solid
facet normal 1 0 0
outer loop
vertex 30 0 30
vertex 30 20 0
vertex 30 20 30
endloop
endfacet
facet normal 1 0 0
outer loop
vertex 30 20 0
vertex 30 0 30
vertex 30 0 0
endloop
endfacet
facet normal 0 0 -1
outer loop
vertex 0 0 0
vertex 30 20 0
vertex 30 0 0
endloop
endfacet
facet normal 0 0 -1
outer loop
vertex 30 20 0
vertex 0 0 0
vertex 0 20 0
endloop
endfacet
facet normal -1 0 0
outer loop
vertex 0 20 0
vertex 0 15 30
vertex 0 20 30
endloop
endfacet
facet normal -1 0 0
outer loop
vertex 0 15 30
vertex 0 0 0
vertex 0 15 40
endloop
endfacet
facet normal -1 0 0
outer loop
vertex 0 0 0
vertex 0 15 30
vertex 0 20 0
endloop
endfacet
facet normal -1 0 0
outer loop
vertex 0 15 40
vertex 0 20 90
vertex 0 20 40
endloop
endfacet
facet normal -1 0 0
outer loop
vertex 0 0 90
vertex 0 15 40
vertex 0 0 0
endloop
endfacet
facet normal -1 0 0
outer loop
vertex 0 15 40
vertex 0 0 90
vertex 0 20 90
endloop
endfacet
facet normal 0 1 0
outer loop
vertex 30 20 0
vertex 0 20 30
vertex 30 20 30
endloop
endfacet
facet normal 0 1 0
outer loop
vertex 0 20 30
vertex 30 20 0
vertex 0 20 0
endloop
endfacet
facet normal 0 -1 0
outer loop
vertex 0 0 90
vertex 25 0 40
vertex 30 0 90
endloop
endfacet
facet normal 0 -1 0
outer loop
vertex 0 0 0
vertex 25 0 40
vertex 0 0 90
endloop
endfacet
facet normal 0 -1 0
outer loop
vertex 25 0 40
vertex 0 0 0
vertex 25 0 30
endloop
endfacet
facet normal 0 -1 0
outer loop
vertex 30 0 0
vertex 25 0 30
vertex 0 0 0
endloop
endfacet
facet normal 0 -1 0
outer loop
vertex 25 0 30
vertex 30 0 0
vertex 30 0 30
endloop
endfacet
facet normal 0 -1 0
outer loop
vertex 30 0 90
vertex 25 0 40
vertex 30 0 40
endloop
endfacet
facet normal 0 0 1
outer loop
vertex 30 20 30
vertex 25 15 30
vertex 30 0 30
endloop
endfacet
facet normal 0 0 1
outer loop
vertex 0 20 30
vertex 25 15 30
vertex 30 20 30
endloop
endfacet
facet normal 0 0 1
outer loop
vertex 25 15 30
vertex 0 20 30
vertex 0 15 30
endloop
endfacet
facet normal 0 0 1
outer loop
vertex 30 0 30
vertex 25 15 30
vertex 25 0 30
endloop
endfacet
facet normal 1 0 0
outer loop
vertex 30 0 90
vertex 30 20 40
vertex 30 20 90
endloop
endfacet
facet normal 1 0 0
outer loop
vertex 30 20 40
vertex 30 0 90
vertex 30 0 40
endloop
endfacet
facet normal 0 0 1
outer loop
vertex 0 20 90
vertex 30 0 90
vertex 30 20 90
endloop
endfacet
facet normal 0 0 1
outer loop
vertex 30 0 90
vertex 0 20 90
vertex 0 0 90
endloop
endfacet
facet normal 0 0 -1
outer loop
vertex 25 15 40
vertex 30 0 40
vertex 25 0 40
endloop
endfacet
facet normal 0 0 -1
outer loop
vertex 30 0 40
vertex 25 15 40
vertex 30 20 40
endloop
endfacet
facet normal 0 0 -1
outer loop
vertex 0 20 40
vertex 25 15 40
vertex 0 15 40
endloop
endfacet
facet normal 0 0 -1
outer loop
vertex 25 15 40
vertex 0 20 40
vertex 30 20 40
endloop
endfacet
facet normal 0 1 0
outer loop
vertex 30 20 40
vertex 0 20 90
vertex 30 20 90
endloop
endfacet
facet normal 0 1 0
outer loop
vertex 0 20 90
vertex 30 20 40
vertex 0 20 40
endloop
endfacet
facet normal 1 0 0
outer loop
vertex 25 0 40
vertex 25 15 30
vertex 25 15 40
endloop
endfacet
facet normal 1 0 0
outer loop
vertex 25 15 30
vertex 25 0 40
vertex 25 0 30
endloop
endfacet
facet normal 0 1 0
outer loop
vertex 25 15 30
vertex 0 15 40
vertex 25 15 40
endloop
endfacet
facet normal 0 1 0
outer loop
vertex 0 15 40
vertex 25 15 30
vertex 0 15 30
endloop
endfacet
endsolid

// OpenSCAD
// Parameters
object_height = 50;
object_width = 30;
object_depth = 20;
cut_height = 30;
extension_height = 10;

// Original object
module original_object() {
    cube([object_width, object_depth, object_height]);
}

// Bottom part
module bottom_part() {
    intersection() {
        original_object();
        translate([0, 0, -0.1])
            cube([object_width, object_depth, cut_height + 0.1]);
    }
}

// Top part
module top_part() {
    translate([0, 0, cut_height + extension_height])
        difference() {
            original_object();
            translate([0, 0, -object_height])
                cube([object_width, object_depth, cut_height]);
        }
}

// Extension
module extension() {
    translate([0, 0, cut_height])
        cube([object_width-5, object_depth-5, extension_height]);
}

// Final assembly
bottom_part();
extension();
top_part();
